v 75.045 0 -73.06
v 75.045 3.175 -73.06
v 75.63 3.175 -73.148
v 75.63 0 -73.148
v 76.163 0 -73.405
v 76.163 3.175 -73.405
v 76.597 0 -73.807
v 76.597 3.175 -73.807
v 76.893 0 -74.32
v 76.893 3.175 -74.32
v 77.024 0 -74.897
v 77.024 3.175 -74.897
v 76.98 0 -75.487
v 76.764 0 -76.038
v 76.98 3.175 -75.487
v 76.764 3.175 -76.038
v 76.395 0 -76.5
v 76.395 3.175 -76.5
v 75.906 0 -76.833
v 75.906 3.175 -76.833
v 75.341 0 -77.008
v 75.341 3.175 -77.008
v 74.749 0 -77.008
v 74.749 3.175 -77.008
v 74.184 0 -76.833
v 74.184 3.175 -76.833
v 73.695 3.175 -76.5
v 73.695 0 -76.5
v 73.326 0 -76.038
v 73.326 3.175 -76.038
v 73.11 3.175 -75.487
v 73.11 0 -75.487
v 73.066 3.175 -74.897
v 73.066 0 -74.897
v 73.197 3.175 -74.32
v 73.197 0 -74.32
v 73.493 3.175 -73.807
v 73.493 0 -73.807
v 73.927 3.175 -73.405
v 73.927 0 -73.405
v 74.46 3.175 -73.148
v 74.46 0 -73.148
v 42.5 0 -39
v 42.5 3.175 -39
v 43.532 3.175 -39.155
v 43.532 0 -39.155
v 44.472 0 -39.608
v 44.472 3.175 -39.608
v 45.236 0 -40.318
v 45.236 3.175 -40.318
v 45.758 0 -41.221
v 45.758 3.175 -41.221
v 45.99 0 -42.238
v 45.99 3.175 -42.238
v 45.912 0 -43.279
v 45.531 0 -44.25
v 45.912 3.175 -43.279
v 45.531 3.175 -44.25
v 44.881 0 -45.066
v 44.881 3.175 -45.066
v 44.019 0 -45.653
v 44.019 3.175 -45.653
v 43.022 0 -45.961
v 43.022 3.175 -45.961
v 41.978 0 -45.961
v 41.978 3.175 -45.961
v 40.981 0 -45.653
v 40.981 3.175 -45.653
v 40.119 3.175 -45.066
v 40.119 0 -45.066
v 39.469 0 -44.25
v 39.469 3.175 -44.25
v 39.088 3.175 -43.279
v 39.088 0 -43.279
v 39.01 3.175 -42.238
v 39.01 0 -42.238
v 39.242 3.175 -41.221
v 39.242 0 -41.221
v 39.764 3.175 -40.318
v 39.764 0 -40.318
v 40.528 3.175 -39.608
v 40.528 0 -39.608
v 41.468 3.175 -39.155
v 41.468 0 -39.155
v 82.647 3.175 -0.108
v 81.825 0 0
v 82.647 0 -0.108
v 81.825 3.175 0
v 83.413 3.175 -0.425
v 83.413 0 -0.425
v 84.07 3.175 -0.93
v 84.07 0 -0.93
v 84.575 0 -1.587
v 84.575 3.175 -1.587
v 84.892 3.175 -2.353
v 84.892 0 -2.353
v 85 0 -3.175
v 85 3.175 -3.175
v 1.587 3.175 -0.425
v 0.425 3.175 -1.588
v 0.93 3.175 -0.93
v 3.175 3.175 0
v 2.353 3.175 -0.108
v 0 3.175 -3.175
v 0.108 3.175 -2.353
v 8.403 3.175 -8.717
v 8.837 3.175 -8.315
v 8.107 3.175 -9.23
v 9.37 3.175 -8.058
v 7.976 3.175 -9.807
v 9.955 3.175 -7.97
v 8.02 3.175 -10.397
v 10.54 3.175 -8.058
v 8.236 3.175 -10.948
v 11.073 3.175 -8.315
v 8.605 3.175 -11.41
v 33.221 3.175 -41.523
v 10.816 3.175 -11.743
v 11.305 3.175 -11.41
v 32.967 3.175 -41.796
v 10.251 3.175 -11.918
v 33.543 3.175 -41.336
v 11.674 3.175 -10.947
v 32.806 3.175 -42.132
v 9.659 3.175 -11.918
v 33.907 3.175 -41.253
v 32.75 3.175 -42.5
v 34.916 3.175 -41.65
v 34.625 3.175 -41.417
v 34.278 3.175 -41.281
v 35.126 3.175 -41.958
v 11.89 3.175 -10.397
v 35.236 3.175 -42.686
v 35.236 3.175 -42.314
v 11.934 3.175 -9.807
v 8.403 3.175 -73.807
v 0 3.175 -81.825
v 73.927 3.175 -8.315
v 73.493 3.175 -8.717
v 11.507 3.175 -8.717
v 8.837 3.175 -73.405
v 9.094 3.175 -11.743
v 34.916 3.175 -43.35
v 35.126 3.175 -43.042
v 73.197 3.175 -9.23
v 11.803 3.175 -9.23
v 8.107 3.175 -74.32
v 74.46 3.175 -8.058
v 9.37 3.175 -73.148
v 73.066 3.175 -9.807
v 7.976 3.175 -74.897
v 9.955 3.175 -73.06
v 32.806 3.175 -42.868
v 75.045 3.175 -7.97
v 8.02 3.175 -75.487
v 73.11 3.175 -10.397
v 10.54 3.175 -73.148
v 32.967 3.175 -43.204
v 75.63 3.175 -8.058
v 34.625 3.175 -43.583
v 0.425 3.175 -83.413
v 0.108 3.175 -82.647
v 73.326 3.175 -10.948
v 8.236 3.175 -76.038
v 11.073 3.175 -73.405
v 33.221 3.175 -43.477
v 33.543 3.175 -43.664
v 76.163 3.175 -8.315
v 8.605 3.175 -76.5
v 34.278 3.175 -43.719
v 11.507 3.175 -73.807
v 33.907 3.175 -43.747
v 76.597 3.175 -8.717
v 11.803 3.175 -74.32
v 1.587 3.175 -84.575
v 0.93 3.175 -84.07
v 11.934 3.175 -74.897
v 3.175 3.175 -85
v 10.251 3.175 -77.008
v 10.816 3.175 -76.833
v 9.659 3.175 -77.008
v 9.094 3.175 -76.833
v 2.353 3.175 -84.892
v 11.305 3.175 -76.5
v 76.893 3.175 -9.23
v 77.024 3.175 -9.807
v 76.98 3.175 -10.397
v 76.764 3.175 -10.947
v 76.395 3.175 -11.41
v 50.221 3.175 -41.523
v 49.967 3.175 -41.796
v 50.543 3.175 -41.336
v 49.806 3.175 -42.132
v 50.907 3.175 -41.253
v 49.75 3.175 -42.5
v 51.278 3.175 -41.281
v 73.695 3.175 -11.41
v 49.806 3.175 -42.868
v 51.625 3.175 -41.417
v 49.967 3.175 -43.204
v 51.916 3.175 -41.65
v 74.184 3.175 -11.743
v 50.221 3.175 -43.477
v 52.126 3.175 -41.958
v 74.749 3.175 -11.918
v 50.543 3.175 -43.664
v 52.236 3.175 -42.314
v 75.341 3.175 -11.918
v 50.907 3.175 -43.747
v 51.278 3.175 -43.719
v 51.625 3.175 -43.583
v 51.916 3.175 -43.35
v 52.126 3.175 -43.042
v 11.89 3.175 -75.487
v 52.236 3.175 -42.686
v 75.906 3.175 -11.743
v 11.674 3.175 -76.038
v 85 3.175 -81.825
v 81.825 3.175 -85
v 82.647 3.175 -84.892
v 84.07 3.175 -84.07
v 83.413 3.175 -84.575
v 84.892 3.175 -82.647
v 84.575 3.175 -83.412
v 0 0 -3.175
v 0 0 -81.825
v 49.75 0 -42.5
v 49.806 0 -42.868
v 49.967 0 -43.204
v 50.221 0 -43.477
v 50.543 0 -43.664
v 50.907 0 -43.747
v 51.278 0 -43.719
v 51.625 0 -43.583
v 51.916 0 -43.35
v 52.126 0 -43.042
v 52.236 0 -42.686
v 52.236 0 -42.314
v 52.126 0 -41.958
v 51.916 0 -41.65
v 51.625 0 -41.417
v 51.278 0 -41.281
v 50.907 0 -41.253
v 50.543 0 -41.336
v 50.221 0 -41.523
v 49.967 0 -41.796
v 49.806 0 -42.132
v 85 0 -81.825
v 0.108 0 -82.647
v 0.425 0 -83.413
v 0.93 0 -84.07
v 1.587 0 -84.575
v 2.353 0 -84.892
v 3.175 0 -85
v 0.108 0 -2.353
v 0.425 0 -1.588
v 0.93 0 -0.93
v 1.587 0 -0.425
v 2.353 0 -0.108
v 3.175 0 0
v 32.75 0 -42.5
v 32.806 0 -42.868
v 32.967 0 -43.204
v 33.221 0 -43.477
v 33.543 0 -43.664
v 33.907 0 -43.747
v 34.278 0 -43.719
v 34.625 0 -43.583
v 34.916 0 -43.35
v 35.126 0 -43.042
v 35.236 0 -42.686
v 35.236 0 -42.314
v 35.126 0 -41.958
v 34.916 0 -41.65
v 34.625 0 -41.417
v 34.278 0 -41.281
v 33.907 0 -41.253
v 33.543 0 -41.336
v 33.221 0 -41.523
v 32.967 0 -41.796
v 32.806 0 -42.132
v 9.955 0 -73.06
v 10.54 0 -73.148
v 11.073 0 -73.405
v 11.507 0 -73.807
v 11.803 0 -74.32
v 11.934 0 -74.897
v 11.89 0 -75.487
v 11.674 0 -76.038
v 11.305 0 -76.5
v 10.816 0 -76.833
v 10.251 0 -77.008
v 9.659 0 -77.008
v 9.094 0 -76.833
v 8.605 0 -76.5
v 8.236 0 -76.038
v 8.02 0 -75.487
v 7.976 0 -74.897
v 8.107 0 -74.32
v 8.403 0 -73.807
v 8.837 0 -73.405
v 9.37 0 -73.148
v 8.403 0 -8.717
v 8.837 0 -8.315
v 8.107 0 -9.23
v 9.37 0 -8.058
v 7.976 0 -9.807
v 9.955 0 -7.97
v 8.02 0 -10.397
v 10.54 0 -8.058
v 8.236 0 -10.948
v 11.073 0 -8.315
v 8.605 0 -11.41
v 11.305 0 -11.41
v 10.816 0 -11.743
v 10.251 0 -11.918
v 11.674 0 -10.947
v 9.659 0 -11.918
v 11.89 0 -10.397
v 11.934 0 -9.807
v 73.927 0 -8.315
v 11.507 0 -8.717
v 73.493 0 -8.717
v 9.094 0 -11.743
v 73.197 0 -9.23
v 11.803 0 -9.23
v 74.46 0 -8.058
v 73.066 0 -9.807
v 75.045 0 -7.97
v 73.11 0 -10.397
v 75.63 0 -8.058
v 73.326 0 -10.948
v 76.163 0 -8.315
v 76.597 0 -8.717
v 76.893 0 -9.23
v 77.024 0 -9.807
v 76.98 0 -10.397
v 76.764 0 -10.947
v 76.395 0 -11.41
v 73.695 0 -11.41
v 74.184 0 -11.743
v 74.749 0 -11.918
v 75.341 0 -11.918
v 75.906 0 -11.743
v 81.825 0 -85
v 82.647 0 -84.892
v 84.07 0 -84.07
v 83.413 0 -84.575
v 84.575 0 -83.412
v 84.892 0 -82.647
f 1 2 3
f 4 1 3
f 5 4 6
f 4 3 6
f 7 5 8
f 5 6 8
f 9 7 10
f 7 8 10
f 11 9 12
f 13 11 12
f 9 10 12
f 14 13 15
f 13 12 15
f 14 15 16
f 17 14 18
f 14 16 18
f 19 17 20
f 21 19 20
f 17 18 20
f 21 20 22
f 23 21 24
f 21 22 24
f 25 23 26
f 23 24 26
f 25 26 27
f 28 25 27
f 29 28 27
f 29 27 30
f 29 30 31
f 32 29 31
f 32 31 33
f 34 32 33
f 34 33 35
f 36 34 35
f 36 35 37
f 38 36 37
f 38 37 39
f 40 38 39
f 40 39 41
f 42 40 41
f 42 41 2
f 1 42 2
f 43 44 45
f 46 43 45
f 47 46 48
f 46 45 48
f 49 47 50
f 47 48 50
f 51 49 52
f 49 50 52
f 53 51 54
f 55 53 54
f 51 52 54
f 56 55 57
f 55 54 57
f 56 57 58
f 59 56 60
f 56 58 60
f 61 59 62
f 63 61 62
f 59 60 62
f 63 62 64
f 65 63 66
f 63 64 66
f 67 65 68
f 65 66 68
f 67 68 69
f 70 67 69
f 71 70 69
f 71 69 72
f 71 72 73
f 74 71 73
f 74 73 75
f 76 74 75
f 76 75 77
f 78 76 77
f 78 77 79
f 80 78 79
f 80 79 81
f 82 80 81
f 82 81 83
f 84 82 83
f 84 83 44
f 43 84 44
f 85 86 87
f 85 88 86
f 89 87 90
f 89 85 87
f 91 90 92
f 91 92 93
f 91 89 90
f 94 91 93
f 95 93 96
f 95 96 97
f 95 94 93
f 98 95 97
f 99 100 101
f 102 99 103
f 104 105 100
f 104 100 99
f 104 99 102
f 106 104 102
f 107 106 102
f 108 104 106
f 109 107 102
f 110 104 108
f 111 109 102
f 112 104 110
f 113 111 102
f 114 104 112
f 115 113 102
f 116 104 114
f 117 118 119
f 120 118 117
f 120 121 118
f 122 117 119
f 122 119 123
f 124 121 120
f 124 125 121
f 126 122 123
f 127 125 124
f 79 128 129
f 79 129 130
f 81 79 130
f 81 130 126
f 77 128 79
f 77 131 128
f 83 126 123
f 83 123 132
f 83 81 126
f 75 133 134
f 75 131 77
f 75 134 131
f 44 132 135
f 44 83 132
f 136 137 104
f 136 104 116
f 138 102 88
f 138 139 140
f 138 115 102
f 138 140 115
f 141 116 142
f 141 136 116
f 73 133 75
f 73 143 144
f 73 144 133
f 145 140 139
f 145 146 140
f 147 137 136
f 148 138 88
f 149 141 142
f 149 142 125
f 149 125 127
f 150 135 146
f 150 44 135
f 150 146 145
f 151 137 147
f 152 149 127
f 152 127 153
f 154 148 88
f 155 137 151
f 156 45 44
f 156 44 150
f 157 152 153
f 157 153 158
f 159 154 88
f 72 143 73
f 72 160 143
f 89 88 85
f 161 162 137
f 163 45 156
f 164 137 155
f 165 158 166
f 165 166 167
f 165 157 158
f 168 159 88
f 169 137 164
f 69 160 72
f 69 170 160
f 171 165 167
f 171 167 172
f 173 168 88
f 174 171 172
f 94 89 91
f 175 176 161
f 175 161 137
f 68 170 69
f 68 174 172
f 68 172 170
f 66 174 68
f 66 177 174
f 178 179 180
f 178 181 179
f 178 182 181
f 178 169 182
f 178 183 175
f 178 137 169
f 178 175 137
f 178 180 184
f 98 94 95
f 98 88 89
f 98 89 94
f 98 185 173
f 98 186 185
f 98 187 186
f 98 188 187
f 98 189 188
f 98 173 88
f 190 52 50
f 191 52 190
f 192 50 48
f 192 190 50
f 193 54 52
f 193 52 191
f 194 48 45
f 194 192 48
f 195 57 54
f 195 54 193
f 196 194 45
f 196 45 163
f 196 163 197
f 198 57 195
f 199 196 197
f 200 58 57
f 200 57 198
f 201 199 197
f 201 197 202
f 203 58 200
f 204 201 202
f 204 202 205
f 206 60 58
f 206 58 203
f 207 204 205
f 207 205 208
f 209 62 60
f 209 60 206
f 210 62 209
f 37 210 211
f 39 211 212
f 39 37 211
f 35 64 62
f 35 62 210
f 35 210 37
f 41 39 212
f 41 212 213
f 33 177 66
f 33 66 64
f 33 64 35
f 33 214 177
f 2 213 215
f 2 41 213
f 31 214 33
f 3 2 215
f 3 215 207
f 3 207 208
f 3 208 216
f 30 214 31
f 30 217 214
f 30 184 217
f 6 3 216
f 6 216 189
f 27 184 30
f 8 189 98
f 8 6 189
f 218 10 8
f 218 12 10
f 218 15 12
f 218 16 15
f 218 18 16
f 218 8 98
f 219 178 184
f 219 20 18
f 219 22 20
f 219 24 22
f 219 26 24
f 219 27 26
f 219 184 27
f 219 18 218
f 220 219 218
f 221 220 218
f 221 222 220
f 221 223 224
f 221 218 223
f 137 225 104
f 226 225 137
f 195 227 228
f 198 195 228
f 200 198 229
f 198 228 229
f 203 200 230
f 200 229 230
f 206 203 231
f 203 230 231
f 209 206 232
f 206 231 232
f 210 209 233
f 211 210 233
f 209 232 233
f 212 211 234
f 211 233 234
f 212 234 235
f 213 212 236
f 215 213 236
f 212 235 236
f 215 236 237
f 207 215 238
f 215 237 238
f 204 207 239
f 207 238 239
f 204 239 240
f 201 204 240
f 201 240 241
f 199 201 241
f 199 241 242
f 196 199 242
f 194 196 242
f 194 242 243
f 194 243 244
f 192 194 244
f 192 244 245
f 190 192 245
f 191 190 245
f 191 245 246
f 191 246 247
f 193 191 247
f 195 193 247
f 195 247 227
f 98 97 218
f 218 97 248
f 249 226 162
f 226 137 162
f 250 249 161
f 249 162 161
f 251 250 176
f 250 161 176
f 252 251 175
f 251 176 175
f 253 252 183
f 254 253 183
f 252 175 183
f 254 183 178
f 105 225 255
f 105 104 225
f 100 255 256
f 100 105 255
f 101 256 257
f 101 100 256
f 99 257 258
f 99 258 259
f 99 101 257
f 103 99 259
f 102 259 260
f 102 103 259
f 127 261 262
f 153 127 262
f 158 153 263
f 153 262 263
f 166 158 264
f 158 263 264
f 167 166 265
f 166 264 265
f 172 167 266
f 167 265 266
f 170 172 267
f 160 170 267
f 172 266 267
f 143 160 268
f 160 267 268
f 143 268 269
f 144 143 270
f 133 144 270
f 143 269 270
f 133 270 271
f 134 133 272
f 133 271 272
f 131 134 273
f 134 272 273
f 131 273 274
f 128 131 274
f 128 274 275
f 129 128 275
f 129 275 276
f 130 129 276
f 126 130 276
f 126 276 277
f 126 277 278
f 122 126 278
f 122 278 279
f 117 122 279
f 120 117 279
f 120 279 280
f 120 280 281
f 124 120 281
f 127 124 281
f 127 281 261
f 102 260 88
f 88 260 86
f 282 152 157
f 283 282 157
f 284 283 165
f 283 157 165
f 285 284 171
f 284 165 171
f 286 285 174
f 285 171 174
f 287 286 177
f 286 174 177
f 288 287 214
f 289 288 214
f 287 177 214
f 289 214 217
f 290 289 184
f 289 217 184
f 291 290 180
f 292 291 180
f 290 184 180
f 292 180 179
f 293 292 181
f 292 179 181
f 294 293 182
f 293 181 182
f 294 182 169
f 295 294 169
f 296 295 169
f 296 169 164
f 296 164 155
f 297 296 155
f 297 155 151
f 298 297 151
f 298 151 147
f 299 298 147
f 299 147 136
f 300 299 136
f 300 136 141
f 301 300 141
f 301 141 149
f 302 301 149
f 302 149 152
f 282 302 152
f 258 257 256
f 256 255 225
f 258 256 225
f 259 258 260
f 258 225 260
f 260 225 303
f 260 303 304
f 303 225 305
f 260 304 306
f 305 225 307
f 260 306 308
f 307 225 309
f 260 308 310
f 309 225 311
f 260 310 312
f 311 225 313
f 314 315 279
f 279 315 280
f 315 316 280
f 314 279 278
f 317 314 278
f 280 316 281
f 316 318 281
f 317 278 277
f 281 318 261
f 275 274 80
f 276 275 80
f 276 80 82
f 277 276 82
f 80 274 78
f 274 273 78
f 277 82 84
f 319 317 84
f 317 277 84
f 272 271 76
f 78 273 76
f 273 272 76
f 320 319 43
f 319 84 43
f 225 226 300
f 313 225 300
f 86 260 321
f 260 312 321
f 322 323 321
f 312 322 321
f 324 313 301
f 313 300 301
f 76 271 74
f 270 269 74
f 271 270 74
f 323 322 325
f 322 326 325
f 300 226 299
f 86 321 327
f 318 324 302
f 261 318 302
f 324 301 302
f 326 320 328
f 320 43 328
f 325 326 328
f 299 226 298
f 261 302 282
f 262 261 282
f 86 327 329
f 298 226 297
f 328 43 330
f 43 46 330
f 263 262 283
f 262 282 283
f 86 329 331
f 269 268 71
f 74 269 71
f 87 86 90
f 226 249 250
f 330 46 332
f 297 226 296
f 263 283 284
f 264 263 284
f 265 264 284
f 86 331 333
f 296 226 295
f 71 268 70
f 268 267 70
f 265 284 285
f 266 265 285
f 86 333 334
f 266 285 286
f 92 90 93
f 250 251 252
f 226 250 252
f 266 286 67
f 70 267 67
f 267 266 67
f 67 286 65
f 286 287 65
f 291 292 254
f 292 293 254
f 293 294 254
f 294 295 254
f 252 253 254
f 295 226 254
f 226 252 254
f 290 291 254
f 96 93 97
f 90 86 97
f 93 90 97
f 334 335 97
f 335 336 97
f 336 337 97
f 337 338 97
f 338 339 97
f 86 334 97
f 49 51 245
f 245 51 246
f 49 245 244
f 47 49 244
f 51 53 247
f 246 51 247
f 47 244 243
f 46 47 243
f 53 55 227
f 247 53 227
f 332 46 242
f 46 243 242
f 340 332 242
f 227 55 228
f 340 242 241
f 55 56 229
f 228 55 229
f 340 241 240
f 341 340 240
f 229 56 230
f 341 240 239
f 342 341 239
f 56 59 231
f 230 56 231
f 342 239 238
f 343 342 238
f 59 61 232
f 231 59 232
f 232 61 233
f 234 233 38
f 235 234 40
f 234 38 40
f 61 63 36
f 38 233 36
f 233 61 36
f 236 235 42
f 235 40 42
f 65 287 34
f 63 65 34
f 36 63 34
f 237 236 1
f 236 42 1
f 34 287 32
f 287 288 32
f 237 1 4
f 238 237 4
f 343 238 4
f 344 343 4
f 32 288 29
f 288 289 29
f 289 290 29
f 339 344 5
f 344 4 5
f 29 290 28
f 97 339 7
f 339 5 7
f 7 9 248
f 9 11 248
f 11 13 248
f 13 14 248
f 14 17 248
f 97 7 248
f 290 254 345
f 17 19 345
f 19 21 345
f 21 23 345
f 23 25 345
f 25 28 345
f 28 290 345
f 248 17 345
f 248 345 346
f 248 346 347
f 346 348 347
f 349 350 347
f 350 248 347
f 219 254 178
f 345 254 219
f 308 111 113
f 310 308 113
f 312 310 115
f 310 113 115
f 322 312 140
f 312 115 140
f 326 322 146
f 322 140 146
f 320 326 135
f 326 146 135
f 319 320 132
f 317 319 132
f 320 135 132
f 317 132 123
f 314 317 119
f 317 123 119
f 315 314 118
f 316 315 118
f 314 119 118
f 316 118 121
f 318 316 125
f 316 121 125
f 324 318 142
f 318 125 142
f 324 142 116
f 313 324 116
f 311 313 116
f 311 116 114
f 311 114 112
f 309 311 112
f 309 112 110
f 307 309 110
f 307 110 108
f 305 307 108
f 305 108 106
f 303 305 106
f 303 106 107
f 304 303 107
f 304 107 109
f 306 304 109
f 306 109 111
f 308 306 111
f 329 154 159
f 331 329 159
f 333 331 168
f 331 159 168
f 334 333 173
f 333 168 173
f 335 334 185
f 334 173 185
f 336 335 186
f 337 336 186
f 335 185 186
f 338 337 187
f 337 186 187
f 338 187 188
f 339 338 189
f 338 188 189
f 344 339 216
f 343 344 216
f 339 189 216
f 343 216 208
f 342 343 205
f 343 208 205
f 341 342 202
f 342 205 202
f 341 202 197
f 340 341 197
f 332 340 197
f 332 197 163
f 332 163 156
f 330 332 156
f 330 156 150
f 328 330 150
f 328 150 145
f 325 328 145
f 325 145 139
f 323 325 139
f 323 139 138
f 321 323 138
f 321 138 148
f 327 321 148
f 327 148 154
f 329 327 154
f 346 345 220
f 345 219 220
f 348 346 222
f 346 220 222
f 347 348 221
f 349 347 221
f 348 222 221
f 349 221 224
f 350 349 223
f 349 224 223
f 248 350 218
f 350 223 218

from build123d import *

# Parameters (mm, degrees)
SKETCH1_W             = 85
SKETCH1_H             = 85
BOSS_EXTRUDE1_DEPTH   = 3.175
SKETCH2_R             = 1.985
CUT_EXTRUDE1_DEPTH    = 121.250075364
LPATTERN1_COUNT       = 2
LPATTERN1_PITCH       = 65.09
LPATTERN1_COUNT_DIR2  = 2
LPATTERN1_PITCH_DIR2  = 65.09
FILLET1_R             = 3.175
SKETCH3_R             = 3.5
CUT_EXTRUDE2_DEPTH    = 121.250075364
M3X0_5_TAPPED_HOLE1_D = 2.5


with BuildPart() as part:
    # Sketch1 → Boss-Extrude1 (new body)
    with BuildSketch(Plane(origin=(0, 0, 0), x_dir=(1, 0, 0), z_dir=(0, 1, 0))):
        with Locations((42.5, 42.5)):
            Rectangle(SKETCH1_W, SKETCH1_H)
    extrude(amount=BOSS_EXTRUDE1_DEPTH)

    # Sketch2 → Cut-Extrude1 (cut, through all)
    with BuildSketch(Plane(origin=(0, 3.175, 0), x_dir=(1, 0, 0), z_dir=(0, 1, 0))):
        with Locations(Location((9.955, 75.045, 0), (0, 0, 270))):
            Circle(SKETCH2_R)
    cut_extrude1 = extrude(amount=-CUT_EXTRUDE1_DEPTH, mode=Mode.SUBTRACT)

    # LPattern1: Cut-Extrude1 2 × 2
    with Locations(*[(j * LPATTERN1_PITCH_DIR2, 0, i * LPATTERN1_PITCH) for i in range(LPATTERN1_COUNT) for j in range(LPATTERN1_COUNT_DIR2) if (i, j) != (0, 0)]):
        add(cut_extrude1, mode=Mode.SUBTRACT)

    # Fillet1
    fillet1_edges = [part.edges().sort_by_distance(p)[0] for p in [
        (0, 1.5875, -85),
        (85, 1.5875, -85),
        (85, 1.5875, 0),
        (0, 1.5875, 0),
    ]]
    fillet(fillet1_edges, radius=FILLET1_R)

    # Sketch3 → Cut-Extrude2 (cut, through all)
    with BuildSketch(Plane(origin=(0, 3.175, 0), x_dir=(1, 0, 0), z_dir=(0, 1, 0))):
        with Locations(Location((42.5, 42.5, 0), (0, 0, 270))):
            Circle(SKETCH3_R)
    extrude(amount=-CUT_EXTRUDE2_DEPTH, mode=Mode.SUBTRACT)

    # M3x0.5 Tapped Hole1 (through all)
    with Locations(Plane(origin=(0, 3.175, 0), x_dir=(1, 0, 0), z_dir=(0, 1, 0))):
        with Locations((34, 42.5), (51, 42.5)):
            Hole(M3X0_5_TAPPED_HOLE1_D / 2)


solid = part.part
